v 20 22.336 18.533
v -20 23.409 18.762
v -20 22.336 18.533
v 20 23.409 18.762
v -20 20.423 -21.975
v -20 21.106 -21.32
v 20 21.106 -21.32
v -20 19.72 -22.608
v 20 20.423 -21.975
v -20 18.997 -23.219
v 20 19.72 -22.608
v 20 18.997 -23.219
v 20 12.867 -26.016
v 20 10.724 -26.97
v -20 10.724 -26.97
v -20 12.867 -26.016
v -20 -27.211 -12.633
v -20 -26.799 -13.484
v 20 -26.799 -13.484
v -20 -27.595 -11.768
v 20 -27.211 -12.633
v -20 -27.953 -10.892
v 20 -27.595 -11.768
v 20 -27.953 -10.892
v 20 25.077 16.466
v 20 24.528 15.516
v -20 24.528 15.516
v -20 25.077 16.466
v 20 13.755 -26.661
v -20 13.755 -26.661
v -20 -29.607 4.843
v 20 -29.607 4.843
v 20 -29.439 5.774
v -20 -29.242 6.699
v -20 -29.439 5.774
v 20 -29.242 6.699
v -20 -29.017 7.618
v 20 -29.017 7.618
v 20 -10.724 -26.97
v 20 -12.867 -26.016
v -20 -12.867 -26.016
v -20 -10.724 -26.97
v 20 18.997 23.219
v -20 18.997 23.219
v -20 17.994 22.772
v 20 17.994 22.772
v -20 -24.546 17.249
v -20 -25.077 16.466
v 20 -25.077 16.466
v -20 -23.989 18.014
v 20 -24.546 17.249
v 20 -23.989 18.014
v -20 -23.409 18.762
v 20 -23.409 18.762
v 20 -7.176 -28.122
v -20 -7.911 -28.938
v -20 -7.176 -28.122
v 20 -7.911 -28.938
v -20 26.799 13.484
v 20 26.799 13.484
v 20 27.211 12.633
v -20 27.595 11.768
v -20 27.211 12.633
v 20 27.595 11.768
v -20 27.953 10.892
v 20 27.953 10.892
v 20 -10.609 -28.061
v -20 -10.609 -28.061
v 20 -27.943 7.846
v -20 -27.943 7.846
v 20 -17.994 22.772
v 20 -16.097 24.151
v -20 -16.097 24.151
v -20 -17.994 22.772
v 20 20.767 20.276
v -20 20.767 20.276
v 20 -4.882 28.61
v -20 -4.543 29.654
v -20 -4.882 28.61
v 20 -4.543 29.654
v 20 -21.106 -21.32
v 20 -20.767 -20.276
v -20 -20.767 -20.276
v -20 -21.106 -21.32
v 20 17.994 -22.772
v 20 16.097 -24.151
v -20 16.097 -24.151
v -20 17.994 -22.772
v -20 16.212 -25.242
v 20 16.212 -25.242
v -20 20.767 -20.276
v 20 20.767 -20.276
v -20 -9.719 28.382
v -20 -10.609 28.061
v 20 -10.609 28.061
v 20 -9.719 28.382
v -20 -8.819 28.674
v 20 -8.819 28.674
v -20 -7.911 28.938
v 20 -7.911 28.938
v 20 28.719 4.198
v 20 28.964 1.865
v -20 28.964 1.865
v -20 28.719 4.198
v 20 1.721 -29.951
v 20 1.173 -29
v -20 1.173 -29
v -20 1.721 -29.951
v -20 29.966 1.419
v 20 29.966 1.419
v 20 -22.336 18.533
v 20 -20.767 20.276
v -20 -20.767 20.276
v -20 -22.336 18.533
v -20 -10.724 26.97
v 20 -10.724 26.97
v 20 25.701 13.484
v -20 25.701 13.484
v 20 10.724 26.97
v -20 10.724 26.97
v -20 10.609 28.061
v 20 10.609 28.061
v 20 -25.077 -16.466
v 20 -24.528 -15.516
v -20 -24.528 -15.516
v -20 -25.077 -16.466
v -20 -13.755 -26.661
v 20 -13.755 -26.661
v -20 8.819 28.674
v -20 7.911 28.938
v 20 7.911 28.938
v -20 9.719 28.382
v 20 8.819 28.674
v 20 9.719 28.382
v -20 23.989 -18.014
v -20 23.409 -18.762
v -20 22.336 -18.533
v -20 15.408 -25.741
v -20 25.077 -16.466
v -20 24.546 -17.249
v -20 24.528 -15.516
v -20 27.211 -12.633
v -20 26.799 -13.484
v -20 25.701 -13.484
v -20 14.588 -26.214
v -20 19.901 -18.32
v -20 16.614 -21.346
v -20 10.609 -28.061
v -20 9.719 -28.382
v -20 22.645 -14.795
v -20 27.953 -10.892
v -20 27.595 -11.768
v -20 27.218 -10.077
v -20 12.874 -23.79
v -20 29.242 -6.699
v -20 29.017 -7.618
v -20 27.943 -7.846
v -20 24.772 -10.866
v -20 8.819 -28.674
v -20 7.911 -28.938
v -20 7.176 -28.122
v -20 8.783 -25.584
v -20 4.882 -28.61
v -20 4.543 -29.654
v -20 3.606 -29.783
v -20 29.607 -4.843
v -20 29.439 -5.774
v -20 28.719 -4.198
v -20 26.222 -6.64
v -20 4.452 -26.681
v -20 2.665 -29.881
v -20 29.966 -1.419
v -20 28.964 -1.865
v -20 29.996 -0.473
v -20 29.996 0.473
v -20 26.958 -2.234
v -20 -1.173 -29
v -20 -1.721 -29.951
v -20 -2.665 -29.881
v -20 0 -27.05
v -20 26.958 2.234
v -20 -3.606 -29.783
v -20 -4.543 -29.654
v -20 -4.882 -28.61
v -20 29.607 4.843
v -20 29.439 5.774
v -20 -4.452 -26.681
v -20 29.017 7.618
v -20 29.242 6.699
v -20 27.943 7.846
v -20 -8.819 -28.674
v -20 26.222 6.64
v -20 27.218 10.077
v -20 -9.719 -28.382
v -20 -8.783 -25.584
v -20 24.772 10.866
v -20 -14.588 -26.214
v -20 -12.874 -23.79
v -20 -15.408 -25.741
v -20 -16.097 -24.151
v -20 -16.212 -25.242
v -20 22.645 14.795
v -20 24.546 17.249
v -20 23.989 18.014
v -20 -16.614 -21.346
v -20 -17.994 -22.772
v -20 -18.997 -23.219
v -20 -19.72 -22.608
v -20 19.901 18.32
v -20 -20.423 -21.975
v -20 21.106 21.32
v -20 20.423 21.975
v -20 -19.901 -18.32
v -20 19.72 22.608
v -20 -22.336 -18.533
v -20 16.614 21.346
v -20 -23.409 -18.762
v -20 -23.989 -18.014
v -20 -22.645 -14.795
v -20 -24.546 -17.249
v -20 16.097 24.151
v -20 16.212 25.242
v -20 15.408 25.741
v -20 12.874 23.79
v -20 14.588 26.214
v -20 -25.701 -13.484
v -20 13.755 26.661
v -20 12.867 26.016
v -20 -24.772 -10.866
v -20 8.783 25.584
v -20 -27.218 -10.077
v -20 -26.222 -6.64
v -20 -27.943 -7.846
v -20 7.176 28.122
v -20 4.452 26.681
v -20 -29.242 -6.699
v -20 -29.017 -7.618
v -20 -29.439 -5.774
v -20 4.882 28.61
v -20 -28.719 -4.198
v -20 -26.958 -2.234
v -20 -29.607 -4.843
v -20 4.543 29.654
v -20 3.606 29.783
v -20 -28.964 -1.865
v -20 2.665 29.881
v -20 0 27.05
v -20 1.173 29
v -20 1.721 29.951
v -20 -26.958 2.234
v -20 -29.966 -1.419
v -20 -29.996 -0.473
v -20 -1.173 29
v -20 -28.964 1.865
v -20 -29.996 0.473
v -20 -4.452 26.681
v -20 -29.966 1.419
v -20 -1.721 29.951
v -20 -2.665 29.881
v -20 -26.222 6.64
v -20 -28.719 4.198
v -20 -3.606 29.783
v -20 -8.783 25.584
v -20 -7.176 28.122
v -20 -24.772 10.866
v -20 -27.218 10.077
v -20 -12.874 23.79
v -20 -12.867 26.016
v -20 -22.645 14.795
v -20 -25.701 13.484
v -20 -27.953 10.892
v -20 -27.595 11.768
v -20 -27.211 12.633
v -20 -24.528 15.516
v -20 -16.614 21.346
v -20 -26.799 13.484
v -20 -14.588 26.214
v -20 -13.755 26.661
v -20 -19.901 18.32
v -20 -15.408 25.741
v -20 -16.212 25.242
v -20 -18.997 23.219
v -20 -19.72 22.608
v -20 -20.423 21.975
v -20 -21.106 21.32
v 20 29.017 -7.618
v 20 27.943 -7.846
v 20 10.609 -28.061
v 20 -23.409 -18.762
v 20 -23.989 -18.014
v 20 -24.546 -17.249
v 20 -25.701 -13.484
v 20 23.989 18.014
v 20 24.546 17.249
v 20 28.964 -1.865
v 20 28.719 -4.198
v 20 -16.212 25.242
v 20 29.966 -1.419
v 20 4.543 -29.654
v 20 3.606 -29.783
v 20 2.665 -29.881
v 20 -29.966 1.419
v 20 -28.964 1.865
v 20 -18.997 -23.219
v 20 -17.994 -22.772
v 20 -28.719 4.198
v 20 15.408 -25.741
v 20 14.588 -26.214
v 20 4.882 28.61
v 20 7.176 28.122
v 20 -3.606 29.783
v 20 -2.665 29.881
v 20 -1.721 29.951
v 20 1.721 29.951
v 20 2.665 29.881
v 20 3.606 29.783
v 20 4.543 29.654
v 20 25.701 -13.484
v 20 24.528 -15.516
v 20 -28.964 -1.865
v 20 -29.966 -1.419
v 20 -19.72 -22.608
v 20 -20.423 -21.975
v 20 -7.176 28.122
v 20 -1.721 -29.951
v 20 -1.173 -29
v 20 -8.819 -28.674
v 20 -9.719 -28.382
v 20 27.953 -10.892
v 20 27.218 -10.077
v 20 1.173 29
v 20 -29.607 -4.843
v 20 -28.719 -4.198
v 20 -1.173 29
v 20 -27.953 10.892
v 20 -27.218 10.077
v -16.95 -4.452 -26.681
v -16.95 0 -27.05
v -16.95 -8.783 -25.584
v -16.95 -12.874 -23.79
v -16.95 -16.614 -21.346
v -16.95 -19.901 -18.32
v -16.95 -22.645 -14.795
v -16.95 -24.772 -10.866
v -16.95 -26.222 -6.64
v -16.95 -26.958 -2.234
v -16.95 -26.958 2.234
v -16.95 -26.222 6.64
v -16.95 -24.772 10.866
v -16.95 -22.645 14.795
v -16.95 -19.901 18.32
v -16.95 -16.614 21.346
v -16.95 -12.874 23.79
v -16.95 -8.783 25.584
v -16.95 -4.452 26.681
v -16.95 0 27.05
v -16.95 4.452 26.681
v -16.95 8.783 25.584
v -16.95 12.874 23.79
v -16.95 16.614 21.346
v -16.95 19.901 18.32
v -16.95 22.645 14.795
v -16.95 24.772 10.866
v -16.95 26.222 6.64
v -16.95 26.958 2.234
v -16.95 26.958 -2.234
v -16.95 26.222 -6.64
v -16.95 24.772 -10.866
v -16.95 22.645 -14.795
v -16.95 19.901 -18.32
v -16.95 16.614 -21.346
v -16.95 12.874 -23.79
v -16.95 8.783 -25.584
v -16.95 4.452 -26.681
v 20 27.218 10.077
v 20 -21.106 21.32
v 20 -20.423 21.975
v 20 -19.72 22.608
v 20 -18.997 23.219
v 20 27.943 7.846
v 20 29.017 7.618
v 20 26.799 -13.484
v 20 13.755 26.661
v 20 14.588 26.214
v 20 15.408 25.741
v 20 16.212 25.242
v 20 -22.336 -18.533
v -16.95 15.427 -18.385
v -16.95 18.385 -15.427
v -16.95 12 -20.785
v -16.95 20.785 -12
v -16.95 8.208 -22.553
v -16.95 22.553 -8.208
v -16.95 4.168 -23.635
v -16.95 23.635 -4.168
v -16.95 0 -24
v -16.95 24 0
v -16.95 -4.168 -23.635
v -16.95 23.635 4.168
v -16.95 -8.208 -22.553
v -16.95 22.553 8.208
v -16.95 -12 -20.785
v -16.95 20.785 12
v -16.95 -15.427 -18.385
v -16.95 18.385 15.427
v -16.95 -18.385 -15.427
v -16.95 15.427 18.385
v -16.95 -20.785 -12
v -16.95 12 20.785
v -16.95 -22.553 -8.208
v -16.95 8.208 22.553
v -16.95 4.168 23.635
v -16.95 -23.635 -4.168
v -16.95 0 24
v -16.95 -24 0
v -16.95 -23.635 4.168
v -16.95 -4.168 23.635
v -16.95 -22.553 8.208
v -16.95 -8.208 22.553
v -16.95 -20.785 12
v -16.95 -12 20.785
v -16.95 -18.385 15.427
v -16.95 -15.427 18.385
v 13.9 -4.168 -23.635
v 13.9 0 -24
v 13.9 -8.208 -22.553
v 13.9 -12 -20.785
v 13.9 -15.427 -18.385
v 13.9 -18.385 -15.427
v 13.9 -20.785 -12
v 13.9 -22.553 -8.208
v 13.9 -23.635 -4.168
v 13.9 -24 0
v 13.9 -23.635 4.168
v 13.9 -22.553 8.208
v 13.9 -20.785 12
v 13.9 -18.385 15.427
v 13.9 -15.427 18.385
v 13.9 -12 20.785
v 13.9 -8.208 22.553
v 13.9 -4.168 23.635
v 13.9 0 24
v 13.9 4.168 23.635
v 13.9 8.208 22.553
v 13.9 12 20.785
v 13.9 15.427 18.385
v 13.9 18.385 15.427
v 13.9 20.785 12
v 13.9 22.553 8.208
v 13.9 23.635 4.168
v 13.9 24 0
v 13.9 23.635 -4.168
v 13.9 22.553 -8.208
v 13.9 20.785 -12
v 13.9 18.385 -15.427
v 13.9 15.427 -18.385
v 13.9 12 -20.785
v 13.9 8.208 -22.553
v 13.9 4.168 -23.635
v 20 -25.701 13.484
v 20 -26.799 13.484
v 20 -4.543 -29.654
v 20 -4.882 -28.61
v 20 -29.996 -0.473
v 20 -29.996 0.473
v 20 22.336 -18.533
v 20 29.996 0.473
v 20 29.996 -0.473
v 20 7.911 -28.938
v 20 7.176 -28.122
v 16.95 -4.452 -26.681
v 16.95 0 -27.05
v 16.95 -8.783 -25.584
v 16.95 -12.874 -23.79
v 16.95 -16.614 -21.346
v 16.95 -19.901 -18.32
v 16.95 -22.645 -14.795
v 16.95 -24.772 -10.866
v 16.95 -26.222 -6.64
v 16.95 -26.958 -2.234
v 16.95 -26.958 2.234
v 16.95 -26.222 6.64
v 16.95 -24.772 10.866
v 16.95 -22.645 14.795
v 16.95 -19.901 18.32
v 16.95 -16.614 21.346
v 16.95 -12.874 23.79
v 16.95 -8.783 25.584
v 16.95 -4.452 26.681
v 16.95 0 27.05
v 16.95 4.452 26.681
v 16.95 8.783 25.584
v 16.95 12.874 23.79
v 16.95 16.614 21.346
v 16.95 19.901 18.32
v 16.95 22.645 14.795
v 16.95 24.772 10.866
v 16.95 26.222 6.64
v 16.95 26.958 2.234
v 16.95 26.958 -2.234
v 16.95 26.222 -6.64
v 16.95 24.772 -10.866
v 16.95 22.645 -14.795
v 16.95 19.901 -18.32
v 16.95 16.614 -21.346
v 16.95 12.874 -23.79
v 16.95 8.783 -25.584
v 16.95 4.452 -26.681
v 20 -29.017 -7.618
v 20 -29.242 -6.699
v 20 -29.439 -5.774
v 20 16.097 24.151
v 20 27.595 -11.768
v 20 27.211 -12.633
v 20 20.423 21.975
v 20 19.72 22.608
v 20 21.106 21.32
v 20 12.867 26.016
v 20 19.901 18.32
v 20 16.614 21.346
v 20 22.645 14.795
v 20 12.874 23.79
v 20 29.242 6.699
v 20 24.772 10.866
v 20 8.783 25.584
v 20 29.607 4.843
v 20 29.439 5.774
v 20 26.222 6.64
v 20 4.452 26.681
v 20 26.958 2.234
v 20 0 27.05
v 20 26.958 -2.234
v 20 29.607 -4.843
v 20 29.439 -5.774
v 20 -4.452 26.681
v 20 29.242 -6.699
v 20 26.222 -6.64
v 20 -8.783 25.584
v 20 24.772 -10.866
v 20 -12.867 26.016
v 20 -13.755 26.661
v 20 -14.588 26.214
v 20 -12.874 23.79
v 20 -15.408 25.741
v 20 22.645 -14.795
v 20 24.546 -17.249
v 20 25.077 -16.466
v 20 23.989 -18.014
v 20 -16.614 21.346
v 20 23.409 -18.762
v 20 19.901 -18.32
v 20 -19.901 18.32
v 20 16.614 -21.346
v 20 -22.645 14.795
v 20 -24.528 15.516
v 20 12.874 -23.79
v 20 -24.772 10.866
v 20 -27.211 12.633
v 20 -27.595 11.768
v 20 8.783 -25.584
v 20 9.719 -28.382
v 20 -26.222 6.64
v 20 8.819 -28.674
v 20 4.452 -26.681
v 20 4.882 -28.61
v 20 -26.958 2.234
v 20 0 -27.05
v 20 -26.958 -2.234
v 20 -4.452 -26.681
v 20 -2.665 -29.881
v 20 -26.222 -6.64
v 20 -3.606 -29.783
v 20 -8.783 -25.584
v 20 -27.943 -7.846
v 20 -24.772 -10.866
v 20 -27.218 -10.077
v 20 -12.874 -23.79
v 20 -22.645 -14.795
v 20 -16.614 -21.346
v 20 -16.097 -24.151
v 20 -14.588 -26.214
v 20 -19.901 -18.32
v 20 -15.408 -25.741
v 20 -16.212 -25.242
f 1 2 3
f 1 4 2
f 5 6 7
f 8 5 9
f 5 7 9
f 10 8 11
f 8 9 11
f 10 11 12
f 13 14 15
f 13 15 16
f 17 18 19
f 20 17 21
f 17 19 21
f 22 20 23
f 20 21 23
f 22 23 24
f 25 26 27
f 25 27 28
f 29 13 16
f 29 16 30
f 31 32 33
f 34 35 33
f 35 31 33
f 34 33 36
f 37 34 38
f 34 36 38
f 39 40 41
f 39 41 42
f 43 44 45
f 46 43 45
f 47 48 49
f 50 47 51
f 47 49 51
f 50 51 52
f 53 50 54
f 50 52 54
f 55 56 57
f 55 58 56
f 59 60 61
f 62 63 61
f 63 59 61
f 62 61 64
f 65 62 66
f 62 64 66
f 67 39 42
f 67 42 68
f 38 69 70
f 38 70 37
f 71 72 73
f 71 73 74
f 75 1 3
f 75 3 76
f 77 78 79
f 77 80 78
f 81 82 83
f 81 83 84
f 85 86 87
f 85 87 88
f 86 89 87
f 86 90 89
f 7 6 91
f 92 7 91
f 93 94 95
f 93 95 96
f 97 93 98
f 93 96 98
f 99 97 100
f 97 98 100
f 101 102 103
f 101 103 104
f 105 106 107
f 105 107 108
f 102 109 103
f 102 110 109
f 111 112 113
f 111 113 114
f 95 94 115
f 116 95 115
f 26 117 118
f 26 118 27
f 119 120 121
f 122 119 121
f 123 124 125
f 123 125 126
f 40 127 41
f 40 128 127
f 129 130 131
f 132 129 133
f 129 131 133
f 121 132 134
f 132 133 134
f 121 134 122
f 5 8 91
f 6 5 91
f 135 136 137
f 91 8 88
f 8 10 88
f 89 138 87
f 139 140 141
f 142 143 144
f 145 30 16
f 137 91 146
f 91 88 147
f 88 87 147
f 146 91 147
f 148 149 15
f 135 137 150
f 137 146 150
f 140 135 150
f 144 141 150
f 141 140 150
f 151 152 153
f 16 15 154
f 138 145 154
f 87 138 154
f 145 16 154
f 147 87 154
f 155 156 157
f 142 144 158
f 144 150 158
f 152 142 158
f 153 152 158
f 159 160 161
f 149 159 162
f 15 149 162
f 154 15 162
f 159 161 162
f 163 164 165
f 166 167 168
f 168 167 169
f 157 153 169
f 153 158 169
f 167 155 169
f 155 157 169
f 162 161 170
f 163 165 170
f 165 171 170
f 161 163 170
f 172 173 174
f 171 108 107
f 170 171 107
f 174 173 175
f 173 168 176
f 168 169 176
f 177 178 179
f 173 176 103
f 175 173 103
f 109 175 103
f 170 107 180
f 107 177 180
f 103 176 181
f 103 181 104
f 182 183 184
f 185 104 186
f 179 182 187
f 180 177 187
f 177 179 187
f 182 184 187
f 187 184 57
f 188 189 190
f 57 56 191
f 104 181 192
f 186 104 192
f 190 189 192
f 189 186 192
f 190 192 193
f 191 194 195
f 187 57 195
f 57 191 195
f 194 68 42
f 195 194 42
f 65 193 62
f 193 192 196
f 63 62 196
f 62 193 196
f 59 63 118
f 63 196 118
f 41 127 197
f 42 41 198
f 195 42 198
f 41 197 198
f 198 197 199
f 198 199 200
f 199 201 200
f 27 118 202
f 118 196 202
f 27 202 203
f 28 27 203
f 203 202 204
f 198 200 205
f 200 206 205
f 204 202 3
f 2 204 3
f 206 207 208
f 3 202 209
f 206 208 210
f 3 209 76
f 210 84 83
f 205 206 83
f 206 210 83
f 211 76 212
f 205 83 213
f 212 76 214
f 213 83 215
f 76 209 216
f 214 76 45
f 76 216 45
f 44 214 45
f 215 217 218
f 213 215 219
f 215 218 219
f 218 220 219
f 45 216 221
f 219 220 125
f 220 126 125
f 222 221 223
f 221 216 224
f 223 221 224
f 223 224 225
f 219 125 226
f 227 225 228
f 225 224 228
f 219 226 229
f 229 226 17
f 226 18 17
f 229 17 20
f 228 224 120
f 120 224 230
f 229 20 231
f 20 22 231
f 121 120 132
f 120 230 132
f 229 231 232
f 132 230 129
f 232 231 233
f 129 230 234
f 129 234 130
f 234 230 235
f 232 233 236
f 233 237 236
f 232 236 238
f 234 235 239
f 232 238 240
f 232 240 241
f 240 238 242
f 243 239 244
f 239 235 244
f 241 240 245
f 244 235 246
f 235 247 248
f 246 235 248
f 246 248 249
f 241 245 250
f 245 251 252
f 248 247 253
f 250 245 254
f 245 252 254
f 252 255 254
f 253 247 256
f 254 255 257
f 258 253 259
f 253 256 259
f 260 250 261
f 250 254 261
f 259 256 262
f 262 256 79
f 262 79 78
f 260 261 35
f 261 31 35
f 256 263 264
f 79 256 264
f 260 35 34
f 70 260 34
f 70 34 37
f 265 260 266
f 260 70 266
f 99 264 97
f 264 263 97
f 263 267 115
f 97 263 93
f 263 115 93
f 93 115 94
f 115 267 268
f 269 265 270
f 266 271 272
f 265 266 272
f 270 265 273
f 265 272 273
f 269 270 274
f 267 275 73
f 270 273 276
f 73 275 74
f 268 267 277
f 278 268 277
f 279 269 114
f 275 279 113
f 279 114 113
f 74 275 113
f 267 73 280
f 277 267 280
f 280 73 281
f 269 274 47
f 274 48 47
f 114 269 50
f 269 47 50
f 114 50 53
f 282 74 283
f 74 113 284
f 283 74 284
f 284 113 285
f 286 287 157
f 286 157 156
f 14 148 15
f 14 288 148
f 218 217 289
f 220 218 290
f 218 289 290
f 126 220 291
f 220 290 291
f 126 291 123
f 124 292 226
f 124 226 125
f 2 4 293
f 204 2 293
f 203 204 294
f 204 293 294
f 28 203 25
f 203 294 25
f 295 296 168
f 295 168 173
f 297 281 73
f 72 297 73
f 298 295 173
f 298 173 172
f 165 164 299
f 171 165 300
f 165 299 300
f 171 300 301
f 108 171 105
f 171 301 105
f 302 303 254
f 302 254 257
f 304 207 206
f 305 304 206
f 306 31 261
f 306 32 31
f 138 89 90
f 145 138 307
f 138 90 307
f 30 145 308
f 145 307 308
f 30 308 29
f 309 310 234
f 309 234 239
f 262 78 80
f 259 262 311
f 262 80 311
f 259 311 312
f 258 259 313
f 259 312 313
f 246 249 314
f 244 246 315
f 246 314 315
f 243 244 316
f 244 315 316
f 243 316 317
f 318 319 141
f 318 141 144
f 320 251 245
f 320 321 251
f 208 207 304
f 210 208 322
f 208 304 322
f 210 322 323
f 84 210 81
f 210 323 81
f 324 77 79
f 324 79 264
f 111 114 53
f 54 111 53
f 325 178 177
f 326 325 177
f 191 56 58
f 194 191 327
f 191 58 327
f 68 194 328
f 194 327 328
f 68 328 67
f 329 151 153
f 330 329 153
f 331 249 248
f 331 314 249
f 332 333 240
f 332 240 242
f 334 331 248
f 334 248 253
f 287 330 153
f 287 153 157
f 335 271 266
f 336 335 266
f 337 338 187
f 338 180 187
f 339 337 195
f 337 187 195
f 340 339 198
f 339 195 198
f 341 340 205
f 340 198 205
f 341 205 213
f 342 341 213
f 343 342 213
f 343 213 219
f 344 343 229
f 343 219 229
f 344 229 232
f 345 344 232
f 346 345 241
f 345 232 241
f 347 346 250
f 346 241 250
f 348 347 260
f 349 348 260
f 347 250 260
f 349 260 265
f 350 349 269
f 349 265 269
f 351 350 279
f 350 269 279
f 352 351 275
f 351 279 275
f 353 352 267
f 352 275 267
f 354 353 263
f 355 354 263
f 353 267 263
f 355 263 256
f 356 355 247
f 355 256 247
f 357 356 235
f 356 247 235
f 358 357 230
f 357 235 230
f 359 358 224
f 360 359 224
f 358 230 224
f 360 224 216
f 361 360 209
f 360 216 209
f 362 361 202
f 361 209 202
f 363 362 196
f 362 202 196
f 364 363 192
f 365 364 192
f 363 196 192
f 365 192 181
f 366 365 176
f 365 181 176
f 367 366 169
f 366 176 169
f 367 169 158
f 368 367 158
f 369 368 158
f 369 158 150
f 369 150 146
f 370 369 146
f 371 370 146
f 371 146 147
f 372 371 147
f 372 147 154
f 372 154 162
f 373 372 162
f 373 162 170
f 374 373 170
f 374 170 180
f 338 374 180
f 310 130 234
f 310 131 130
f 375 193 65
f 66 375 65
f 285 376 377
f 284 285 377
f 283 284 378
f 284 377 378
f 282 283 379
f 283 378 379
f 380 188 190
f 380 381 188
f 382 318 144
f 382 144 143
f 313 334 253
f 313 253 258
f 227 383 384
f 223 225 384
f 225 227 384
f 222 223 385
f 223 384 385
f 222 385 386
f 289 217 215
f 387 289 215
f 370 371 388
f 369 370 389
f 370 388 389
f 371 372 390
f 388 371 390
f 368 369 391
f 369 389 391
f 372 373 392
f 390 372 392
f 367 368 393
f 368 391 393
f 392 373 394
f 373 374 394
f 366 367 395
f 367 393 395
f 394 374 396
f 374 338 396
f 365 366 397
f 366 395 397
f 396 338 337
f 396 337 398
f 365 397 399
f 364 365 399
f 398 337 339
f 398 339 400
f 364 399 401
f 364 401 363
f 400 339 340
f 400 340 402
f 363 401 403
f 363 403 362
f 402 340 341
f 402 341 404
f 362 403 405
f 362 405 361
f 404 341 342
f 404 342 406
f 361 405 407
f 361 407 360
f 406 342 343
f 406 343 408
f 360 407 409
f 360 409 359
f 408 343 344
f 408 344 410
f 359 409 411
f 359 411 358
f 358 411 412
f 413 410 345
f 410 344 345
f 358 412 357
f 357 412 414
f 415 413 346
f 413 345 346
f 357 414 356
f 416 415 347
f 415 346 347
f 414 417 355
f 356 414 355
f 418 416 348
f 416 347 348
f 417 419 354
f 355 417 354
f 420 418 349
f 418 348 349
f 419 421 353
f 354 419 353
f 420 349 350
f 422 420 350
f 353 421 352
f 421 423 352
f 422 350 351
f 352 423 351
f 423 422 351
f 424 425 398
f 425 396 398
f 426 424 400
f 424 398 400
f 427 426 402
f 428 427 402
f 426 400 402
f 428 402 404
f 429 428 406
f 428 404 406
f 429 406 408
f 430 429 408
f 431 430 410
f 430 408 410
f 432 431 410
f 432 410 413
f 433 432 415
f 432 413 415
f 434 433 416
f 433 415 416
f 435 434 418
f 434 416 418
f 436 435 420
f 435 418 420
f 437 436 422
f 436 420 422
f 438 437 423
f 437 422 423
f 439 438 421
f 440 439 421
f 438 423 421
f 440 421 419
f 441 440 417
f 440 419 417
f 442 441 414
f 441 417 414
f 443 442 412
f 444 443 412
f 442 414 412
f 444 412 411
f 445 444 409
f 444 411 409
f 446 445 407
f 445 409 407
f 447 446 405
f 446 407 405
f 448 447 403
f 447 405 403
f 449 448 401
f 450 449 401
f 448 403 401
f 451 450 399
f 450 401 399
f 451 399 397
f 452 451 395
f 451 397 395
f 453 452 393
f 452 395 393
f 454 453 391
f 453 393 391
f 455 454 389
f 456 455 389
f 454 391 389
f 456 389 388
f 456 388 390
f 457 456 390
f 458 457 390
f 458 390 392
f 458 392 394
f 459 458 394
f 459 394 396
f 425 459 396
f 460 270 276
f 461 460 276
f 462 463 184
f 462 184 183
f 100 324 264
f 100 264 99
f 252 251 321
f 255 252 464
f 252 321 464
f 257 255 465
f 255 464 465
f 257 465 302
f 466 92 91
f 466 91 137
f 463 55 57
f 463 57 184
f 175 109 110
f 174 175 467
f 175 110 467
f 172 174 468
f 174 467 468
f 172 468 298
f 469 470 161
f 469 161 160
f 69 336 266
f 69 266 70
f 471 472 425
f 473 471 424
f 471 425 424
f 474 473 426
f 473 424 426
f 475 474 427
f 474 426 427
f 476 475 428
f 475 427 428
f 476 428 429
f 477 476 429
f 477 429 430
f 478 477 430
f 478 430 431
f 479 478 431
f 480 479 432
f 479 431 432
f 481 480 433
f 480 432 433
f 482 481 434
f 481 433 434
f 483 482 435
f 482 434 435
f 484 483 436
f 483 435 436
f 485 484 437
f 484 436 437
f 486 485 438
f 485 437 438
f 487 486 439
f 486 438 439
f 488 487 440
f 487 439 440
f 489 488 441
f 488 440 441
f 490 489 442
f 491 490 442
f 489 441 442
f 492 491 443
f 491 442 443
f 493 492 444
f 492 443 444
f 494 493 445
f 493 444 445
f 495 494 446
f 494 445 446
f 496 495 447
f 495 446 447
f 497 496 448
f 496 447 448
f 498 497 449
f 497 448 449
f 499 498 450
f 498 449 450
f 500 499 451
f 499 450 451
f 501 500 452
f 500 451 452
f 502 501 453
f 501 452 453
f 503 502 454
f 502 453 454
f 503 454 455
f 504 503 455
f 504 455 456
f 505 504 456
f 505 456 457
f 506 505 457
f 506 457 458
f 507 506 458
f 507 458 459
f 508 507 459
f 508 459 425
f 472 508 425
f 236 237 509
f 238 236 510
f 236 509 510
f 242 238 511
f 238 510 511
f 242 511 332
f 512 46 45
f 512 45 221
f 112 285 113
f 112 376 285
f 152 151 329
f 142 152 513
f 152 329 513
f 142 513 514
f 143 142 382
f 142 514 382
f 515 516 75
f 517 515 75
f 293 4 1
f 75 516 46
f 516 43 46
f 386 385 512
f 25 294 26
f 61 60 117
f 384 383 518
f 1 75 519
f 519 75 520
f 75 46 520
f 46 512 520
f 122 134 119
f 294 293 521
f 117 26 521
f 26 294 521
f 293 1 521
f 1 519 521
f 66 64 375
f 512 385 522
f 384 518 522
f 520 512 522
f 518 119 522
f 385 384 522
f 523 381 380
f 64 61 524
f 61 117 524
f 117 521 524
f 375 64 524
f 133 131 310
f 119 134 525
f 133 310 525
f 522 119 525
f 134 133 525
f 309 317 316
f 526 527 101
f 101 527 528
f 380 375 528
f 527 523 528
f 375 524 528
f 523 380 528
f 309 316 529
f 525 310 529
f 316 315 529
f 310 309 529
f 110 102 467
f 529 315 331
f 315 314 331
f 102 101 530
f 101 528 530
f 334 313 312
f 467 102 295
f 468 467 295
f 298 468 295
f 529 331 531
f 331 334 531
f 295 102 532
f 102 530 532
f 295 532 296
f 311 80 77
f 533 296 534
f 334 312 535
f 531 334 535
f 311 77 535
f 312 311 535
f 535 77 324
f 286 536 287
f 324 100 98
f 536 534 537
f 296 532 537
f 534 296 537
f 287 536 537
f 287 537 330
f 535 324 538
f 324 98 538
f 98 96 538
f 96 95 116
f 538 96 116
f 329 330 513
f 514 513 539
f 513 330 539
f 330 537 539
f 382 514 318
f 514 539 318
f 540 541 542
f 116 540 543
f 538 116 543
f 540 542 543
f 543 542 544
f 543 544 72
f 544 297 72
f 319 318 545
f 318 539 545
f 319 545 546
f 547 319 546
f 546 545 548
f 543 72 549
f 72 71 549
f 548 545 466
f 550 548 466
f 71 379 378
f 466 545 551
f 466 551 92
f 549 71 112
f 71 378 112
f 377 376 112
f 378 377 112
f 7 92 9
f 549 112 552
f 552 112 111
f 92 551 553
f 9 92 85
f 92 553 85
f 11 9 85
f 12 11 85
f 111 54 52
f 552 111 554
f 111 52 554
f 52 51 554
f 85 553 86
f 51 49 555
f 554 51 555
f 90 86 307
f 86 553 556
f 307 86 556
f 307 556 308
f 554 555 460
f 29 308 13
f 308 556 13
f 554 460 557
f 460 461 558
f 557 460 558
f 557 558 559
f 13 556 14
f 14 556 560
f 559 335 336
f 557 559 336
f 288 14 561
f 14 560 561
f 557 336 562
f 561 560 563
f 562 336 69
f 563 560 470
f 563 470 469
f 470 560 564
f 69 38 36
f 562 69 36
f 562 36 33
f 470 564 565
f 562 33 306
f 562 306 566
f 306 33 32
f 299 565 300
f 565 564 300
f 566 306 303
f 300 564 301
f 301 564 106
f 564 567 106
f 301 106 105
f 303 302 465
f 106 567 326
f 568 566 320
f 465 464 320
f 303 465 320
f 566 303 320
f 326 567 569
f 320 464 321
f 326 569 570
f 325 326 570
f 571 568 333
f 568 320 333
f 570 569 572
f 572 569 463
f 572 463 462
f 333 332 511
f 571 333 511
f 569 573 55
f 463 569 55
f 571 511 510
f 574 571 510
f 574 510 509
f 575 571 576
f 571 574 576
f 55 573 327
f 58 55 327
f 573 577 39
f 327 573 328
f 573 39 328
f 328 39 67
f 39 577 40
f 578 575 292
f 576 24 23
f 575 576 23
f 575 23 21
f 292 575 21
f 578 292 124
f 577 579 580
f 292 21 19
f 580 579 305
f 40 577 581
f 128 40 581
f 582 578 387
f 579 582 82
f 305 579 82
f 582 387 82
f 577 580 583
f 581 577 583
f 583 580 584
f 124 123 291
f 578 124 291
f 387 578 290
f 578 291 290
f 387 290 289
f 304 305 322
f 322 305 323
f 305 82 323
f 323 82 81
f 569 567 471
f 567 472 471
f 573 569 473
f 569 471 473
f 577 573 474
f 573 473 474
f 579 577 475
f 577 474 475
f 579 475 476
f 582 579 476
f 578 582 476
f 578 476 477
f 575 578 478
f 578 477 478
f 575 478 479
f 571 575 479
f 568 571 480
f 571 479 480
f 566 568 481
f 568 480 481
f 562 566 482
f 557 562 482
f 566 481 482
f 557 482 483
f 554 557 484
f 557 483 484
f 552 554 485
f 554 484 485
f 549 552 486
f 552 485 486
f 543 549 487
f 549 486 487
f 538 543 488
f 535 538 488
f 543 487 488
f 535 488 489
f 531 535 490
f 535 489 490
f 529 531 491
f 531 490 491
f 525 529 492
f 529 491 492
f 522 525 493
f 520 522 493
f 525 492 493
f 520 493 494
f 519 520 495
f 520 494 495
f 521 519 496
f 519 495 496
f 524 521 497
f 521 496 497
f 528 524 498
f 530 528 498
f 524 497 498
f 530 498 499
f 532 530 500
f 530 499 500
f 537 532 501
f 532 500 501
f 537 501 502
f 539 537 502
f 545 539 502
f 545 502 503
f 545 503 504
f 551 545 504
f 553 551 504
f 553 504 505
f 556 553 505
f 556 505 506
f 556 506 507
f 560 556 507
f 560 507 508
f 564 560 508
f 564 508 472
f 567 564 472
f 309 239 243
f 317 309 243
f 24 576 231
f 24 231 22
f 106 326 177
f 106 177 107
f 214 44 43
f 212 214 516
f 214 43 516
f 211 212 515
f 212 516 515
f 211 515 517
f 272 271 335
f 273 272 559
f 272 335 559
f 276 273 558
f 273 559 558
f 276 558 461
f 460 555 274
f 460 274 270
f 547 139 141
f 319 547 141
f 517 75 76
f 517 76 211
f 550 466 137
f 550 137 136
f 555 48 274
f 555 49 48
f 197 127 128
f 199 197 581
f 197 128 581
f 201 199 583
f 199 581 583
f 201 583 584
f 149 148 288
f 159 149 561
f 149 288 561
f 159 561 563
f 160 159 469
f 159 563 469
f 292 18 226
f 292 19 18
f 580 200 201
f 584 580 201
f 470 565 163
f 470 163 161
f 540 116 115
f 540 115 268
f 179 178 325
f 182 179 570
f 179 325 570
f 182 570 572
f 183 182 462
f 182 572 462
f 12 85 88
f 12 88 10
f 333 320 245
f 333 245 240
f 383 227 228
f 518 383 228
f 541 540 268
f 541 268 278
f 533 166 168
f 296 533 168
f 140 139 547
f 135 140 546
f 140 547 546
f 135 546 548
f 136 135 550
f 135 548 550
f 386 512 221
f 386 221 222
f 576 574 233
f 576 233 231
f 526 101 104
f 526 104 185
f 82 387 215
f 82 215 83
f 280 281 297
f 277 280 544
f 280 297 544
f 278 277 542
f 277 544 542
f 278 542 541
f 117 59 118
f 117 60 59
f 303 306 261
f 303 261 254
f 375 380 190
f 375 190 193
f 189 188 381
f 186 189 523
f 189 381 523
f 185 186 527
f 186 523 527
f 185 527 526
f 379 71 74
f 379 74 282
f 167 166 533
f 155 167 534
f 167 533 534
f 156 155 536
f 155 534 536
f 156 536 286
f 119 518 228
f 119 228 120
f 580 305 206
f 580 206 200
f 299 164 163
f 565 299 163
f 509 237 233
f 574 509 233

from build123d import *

# Parameters (mm, degrees)
CUT_EXTRUDE2_DEPTH = 47.904157598
CIRPATTERN4_COUNT  = 30


with BuildPart() as part:
    # Sketch1 → Revolve1 (revolve)
    with BuildSketch(Plane.XY, mode=Mode.PRIVATE) as revolve1_sk:
        Polygon((-20, 30), (20, 30), (20, 27.05), (16.95, 27.05), (13.9, 24), (-16.95, 24), (-16.95, 27.05), (-20, 27.05), align=None)
    revolve(revolve1_sk.sketch.rotate(Axis((22, 0, 0), (-1, 0, 0)), 90), axis=Axis((22, 0, 0), (-1, 0, 0)))

    # Sketch6 → Cut-Extrude2 (cut, symmetric)
    with BuildSketch(Plane(origin=(0, 0, 0), x_dir=(0, 0, -1), z_dir=(1, 0, 0))):
        Polygon((-30, 1.75), (-29, 1.172649731), (-29, -1.172649731), (-30, -1.75), align=None)
    cut_extrude2 = extrude(amount=CUT_EXTRUDE2_DEPTH, both=True, mode=Mode.SUBTRACT)

    # CirPattern4: Cut-Extrude2 ×30 about axis
    cirpattern4_axis = Axis((0, 0, 0), (1, 0, 0))
    for i in range(1, CIRPATTERN4_COUNT):
        add(cut_extrude2.rotate(cirpattern4_axis, i * 360 / CIRPATTERN4_COUNT), mode=Mode.SUBTRACT)


solid = part.part
